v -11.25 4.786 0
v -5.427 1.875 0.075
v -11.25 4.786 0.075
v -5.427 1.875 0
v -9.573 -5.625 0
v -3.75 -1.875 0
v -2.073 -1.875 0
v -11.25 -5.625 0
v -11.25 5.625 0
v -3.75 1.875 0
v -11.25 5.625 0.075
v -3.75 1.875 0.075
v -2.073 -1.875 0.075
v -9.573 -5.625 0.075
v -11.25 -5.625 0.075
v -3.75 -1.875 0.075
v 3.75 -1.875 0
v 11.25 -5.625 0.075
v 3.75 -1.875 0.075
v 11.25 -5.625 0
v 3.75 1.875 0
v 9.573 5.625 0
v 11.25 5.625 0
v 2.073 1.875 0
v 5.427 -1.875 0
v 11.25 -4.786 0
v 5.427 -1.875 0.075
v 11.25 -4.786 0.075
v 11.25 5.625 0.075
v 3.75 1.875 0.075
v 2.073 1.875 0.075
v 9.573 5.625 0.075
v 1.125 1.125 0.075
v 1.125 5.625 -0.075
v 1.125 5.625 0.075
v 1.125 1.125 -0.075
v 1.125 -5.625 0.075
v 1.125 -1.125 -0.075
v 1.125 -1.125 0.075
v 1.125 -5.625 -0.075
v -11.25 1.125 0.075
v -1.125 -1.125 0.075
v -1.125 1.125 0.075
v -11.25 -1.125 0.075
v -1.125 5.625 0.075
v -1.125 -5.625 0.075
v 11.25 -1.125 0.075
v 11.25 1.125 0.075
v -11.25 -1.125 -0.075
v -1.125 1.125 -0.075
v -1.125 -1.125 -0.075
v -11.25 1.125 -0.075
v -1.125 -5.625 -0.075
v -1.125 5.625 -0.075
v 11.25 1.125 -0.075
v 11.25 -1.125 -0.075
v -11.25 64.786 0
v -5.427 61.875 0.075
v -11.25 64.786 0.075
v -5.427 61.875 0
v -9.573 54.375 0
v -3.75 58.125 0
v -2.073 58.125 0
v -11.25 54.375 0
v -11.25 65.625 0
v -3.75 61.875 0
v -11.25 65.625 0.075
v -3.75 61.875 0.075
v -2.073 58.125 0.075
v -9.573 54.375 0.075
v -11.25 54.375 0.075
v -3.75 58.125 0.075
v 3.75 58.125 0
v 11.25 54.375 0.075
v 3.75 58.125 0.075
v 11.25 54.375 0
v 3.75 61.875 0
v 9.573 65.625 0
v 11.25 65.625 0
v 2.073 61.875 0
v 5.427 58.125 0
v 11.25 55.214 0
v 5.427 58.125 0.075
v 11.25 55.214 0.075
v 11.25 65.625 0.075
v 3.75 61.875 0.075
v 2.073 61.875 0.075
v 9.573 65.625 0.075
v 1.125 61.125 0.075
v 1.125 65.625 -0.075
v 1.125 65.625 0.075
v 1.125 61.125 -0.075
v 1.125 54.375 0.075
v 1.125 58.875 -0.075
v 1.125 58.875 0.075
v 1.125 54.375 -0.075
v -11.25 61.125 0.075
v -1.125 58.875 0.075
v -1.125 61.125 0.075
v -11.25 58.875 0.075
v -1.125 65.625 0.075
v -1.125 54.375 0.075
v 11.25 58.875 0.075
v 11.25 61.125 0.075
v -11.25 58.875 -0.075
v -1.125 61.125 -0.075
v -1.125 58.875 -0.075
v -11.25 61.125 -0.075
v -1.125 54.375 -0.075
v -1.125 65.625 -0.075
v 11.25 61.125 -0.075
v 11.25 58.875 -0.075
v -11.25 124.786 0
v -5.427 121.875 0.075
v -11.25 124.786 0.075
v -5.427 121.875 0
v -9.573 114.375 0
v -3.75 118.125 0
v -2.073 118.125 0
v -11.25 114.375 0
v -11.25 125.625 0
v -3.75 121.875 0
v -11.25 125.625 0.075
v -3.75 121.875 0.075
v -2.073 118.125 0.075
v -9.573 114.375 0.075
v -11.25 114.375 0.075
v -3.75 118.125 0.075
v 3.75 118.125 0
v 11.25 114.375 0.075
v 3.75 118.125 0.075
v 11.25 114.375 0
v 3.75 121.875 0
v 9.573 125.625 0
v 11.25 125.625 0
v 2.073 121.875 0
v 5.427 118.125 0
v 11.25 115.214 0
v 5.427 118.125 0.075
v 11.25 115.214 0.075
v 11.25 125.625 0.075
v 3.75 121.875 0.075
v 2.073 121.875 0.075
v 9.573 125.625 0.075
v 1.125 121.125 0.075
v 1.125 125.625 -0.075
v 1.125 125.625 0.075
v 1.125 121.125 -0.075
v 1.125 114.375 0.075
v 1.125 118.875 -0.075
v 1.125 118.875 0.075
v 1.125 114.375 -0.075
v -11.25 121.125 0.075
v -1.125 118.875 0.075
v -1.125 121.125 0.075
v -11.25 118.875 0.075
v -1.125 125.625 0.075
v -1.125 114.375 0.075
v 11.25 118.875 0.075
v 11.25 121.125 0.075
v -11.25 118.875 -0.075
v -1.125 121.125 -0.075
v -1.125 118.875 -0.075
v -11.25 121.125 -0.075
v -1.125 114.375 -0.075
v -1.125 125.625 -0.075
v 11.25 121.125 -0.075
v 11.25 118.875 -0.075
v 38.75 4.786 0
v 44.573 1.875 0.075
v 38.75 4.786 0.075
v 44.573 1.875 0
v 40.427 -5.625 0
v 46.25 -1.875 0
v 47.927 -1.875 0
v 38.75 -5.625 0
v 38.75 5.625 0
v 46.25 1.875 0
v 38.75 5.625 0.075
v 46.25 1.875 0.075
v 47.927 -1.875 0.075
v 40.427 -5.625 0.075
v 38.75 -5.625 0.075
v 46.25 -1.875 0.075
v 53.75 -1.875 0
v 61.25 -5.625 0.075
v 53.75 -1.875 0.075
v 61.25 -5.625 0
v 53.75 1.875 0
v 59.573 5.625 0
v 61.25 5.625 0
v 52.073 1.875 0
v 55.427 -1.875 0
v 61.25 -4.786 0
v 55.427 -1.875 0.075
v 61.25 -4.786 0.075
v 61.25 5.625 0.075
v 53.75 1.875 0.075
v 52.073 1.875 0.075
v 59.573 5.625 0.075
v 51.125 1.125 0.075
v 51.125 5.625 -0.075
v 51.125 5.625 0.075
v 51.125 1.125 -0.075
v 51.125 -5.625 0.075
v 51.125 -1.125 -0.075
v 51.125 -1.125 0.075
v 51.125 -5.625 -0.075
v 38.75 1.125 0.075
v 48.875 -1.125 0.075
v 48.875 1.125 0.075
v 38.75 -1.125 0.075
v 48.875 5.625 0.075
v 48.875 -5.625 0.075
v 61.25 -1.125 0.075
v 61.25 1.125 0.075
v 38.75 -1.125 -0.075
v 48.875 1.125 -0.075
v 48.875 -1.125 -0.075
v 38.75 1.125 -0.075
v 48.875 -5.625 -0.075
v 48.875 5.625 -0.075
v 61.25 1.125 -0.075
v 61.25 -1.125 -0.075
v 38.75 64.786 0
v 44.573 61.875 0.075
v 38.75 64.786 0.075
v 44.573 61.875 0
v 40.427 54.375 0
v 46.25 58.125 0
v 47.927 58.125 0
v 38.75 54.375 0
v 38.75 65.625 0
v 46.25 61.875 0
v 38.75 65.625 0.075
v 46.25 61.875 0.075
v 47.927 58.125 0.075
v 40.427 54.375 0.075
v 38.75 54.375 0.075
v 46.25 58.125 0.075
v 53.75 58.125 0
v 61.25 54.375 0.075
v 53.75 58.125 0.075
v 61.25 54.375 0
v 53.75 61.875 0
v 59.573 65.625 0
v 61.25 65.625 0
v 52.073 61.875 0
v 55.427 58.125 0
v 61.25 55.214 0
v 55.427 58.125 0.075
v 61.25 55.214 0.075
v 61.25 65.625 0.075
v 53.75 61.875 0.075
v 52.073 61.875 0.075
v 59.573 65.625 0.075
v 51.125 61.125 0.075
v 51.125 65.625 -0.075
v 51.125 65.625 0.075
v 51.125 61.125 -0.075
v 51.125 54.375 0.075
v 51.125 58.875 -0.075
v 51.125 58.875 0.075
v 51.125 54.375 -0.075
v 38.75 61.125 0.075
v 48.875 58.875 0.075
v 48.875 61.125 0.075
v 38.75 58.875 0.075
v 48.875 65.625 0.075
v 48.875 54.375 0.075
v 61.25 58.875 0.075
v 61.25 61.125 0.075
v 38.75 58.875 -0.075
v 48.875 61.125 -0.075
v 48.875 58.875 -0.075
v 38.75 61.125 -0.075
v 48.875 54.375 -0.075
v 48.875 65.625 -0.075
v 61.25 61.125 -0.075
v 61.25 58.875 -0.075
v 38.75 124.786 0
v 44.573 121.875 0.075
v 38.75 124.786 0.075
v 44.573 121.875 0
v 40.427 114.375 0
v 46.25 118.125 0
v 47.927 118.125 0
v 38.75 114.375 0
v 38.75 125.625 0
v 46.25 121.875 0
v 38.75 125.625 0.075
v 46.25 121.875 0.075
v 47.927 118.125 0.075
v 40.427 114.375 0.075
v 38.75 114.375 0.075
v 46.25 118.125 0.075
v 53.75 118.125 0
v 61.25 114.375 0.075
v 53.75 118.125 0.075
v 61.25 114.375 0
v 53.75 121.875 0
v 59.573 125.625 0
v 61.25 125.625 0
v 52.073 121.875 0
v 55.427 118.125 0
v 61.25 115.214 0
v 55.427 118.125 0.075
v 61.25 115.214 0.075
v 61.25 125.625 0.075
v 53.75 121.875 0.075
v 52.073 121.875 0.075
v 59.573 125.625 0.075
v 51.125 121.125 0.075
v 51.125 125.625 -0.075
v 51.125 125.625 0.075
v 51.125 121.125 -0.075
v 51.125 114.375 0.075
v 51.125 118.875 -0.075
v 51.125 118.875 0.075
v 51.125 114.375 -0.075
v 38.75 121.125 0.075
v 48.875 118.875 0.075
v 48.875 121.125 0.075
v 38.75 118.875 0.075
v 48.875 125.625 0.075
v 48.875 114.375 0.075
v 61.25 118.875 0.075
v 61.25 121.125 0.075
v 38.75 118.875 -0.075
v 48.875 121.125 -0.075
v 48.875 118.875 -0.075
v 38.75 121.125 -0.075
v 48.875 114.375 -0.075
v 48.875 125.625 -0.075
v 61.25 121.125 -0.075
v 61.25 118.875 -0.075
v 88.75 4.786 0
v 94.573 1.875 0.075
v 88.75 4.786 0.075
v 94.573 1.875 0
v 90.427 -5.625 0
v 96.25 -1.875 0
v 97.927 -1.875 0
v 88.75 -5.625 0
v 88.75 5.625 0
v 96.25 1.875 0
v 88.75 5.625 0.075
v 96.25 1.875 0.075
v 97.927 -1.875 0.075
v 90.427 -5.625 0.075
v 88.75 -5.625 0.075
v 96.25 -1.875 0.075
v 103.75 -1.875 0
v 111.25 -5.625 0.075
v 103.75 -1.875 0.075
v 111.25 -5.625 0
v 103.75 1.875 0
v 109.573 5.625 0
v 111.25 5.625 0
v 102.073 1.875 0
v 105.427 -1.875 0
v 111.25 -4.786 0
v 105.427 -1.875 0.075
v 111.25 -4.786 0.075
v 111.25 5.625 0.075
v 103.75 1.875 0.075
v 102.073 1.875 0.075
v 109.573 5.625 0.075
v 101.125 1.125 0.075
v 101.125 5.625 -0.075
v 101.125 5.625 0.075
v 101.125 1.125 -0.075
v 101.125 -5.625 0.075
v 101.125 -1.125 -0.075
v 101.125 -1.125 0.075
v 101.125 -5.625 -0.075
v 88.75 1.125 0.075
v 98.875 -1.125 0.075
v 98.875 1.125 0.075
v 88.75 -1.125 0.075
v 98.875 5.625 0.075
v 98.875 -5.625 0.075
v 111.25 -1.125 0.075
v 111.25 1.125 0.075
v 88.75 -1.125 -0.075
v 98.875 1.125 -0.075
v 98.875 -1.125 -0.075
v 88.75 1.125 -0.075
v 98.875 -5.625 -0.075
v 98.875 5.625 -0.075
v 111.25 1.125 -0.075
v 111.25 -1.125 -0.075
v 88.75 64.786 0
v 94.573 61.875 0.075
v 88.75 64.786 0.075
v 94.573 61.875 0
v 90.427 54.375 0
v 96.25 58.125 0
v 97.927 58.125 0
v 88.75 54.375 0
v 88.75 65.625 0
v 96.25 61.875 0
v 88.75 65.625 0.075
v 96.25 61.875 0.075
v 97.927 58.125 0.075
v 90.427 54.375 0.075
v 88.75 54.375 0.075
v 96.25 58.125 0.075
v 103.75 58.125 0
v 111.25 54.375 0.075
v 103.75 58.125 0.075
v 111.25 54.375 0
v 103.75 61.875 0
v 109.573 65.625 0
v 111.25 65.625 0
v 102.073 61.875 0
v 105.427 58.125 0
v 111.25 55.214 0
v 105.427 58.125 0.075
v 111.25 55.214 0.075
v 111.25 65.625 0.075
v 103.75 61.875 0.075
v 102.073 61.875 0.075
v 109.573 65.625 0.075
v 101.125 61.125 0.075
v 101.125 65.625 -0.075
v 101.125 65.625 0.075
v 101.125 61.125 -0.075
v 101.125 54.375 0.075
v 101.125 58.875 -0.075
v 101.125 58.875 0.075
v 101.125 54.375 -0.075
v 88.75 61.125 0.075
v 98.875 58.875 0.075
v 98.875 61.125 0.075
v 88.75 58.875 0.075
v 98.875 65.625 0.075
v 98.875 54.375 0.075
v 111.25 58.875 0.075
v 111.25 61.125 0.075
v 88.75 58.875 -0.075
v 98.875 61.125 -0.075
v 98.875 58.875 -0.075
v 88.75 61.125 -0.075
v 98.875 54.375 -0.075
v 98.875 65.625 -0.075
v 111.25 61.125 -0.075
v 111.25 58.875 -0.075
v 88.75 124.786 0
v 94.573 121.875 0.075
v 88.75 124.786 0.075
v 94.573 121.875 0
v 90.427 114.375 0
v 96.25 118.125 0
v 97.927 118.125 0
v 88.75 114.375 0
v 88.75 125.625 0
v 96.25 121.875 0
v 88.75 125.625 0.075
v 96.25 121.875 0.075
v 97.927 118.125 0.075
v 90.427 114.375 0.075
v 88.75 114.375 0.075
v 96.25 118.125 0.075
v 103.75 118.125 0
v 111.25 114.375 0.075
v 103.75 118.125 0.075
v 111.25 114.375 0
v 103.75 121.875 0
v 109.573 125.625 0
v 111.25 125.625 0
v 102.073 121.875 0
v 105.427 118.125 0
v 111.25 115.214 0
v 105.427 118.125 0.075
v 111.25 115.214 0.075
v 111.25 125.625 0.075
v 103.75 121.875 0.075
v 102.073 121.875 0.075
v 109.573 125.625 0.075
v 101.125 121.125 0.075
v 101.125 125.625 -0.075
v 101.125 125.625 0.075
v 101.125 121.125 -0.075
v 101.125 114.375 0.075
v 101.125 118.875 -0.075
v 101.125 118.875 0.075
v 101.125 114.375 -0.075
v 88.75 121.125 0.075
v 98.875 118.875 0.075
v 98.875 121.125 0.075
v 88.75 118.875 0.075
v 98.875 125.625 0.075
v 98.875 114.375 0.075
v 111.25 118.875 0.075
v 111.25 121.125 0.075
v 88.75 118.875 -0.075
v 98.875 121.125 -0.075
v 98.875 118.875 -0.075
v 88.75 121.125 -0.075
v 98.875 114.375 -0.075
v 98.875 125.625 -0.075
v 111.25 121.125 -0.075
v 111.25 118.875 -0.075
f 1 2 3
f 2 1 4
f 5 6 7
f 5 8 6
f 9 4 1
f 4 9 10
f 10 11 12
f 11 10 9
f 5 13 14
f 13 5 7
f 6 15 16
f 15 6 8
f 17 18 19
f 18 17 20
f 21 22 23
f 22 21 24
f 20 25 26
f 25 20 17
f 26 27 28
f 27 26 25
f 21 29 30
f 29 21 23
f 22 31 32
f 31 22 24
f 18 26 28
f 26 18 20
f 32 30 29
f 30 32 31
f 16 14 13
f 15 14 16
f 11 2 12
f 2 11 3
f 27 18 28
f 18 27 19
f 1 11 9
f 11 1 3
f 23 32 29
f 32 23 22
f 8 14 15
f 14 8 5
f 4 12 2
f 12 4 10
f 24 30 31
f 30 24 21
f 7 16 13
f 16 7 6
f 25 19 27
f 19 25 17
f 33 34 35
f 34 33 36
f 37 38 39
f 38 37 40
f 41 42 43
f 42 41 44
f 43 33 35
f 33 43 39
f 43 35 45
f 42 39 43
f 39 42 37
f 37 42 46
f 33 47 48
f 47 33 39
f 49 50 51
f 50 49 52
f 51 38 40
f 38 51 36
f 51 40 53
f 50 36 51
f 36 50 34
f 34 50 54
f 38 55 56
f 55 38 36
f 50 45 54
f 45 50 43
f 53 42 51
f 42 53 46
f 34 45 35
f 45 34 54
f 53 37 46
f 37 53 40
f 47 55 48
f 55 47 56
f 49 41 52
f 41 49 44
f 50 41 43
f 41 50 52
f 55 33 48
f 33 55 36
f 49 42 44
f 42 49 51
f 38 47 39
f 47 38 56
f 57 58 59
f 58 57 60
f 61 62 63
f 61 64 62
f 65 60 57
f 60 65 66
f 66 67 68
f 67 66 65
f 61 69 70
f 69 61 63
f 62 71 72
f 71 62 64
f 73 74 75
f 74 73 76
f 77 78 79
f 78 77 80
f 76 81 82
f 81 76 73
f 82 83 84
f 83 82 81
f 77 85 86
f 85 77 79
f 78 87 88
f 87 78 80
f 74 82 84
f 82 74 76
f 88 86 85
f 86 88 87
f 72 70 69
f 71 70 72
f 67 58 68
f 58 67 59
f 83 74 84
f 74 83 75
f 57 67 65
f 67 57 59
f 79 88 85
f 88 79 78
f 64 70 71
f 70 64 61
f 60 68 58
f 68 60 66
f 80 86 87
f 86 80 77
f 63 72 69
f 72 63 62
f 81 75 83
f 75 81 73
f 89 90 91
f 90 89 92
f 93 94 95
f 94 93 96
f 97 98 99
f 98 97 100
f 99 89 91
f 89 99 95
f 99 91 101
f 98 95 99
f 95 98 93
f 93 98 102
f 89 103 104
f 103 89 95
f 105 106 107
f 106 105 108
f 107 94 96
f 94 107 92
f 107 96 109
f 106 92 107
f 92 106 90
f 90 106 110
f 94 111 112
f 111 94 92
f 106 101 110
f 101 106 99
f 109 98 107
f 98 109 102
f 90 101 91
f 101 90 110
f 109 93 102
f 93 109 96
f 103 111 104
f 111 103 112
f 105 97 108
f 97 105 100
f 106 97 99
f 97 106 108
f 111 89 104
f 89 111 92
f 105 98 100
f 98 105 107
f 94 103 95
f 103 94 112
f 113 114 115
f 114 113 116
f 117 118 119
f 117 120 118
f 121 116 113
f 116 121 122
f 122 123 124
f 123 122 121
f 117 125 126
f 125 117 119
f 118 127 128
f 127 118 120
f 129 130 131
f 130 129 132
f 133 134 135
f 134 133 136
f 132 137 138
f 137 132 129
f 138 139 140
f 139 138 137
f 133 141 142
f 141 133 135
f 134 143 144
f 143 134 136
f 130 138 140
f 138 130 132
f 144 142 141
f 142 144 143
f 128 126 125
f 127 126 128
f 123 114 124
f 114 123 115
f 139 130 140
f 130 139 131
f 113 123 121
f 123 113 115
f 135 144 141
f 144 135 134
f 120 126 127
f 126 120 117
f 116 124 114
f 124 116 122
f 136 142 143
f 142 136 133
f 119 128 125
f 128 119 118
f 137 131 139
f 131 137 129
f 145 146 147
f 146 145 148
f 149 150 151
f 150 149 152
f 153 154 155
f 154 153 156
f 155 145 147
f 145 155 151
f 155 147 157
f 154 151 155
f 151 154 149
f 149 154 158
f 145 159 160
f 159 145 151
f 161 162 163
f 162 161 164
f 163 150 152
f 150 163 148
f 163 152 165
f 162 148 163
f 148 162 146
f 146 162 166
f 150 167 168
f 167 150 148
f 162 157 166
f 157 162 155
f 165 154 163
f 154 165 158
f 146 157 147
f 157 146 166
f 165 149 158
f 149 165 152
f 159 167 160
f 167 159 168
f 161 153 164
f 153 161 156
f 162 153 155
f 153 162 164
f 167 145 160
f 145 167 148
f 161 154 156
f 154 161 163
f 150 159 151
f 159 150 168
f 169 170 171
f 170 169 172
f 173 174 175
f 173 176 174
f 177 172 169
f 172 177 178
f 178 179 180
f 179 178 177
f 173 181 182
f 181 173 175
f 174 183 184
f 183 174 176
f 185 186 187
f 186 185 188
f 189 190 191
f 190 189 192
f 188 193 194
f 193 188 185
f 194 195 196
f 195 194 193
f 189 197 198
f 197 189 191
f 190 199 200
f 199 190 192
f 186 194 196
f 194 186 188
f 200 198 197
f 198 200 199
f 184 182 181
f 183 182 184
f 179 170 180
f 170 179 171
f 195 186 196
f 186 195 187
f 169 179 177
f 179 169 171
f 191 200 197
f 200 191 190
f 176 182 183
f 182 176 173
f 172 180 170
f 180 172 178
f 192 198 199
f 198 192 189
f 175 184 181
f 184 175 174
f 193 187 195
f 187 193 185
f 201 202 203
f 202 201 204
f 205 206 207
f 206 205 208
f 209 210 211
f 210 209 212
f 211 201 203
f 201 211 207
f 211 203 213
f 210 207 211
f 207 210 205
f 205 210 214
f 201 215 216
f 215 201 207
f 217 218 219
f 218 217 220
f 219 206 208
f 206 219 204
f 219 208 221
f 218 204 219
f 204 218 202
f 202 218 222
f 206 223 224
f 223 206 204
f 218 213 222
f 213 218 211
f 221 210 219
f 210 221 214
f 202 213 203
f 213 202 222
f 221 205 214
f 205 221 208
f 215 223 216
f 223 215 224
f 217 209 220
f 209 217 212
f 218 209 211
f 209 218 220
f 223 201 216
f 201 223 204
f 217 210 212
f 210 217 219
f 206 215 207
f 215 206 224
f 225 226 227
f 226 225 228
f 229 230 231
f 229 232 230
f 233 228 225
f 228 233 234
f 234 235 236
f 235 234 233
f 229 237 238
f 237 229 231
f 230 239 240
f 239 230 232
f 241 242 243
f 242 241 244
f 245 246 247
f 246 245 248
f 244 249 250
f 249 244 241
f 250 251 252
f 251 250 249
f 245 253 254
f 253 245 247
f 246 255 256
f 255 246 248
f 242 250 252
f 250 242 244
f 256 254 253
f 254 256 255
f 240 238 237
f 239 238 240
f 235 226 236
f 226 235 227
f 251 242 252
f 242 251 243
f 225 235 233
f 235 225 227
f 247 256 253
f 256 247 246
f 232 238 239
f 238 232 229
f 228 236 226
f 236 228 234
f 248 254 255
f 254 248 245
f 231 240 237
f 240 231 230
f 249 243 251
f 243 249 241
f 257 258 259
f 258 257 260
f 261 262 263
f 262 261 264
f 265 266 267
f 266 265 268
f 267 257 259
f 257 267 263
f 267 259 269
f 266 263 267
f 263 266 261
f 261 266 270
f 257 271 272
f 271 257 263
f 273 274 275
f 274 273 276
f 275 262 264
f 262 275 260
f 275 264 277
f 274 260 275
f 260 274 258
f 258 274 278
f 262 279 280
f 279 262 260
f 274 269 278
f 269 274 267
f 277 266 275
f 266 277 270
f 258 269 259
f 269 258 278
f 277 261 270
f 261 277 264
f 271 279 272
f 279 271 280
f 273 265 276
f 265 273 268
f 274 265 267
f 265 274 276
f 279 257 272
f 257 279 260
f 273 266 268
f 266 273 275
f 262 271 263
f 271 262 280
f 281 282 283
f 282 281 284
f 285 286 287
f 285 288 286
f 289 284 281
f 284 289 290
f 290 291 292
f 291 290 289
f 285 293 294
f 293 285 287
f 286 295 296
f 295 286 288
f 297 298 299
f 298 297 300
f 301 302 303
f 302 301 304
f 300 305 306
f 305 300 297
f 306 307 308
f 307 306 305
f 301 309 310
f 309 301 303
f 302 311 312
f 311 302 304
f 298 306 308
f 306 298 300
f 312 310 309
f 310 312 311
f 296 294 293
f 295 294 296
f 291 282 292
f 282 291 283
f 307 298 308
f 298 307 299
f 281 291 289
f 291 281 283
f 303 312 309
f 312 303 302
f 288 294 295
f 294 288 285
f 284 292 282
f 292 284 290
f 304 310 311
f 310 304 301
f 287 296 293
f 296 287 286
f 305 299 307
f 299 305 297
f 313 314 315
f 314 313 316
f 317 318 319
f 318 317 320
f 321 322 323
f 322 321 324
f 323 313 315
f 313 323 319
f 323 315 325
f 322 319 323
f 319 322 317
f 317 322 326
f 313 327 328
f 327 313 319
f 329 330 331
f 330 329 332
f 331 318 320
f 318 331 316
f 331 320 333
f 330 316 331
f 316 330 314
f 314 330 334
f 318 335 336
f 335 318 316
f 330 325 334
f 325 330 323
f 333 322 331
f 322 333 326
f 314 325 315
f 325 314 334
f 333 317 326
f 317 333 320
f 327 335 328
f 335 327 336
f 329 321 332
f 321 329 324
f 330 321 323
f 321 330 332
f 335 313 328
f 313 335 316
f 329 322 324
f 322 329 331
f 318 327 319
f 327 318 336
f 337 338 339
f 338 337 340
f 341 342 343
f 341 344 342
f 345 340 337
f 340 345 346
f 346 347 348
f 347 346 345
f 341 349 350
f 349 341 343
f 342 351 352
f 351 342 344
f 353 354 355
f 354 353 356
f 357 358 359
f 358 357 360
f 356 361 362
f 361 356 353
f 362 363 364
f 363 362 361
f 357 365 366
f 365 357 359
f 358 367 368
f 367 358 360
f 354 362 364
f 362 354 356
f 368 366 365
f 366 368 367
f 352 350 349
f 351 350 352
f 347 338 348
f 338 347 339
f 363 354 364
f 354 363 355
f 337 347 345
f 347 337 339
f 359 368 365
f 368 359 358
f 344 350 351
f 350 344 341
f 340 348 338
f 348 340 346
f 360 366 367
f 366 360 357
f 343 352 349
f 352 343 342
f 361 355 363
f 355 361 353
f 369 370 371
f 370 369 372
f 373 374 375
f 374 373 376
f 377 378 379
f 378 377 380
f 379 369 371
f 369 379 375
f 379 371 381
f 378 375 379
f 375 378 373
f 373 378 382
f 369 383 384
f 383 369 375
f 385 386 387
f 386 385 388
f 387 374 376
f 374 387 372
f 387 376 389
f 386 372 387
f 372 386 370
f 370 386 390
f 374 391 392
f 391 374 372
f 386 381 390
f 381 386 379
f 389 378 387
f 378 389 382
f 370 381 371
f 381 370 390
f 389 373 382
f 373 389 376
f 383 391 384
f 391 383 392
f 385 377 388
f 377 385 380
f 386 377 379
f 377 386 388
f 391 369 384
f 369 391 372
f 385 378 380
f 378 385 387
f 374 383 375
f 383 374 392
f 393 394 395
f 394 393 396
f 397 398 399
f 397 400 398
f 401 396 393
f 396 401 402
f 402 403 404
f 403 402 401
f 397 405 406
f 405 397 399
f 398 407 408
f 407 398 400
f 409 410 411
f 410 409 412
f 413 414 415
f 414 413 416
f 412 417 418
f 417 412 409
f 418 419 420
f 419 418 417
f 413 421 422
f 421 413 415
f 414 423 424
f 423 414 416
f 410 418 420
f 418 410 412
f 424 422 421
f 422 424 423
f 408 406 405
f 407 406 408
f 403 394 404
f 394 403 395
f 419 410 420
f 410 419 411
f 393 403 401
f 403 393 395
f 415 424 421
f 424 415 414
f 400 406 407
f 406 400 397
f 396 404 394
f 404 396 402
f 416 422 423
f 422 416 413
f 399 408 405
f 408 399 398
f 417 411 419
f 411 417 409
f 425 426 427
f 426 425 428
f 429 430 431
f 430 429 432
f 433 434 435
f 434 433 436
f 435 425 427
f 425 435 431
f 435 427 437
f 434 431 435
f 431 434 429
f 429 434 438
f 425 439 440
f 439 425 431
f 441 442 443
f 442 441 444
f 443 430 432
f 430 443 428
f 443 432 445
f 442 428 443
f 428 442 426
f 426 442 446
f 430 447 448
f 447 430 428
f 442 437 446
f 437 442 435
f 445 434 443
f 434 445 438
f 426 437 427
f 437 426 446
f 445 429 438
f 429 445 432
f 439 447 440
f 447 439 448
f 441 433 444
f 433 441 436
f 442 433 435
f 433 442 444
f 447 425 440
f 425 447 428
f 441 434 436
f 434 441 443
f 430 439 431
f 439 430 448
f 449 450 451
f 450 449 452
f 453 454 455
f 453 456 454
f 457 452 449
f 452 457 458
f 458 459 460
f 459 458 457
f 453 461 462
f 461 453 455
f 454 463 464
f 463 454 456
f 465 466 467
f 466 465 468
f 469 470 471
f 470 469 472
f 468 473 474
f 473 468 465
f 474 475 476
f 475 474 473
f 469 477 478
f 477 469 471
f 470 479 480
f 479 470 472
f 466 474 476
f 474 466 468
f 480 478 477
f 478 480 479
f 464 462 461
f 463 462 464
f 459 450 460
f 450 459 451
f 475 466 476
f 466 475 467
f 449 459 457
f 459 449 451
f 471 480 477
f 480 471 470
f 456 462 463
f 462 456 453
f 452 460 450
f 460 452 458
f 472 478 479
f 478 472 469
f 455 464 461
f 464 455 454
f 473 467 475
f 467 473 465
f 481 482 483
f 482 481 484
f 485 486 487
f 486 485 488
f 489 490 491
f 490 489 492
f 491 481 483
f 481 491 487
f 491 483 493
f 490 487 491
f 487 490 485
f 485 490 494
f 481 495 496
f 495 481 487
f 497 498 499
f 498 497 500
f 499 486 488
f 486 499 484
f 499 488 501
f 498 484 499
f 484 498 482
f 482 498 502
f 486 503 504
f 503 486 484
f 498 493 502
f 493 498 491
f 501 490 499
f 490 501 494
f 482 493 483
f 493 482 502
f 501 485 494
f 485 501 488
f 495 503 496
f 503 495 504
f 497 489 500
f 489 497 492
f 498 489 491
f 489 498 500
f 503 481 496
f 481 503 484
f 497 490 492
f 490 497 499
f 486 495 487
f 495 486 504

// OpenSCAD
/*
 * Mult-material test
 *
 * Copyright 2012 <b@Zi.iS>
 * License CC BY 3.0
 *
 */
for(xxx=[0:2]) for(yyy=[0:2]) {
	translate([50*xxx,60*yyy,0])
scale(.75) {
difference() {
	intersection() {
		cube(center=true,[
			30,
			15,
			.2
		]);
		union() {
			rotate([
				0,
				0,
				90-26.565
			]) {
				translate([
					-1,
					0,
					0
				]) {
					cube([
						1,
						400,
						.2
					]);
				}
			}
			rotate([
				0,
				0,
				90+26.565
			]) {
				translate([
					-1,
					0,
					0
				]) {
					cube([
						1,
						400,
						.2
					]);
				}
			}
			rotate([
				0,
				0,
				270-26.565
			]) {
				translate([
					-1,
					0,
					0
				]) {
					cube([
						1,
						400,
						.2
					]);
				}
			}
			rotate([
				0,
				0,
				270+26.565
			]) {
				translate([
					-1,
					0,
					0
				]) {
					cube([
						1,
						400,
						.2
					]);
				}
			}
	
		}
	}		

	cube(center=true, [
		5,
		400,
		1
	]);
	cube(center=true, [
		400,
		5,
		1
	]);
	

}
	cube(center=true, [
		3,
		15,
		.2
	]);
	cube(center=true, [
		30,
		3,
		.2
	]);

}}
